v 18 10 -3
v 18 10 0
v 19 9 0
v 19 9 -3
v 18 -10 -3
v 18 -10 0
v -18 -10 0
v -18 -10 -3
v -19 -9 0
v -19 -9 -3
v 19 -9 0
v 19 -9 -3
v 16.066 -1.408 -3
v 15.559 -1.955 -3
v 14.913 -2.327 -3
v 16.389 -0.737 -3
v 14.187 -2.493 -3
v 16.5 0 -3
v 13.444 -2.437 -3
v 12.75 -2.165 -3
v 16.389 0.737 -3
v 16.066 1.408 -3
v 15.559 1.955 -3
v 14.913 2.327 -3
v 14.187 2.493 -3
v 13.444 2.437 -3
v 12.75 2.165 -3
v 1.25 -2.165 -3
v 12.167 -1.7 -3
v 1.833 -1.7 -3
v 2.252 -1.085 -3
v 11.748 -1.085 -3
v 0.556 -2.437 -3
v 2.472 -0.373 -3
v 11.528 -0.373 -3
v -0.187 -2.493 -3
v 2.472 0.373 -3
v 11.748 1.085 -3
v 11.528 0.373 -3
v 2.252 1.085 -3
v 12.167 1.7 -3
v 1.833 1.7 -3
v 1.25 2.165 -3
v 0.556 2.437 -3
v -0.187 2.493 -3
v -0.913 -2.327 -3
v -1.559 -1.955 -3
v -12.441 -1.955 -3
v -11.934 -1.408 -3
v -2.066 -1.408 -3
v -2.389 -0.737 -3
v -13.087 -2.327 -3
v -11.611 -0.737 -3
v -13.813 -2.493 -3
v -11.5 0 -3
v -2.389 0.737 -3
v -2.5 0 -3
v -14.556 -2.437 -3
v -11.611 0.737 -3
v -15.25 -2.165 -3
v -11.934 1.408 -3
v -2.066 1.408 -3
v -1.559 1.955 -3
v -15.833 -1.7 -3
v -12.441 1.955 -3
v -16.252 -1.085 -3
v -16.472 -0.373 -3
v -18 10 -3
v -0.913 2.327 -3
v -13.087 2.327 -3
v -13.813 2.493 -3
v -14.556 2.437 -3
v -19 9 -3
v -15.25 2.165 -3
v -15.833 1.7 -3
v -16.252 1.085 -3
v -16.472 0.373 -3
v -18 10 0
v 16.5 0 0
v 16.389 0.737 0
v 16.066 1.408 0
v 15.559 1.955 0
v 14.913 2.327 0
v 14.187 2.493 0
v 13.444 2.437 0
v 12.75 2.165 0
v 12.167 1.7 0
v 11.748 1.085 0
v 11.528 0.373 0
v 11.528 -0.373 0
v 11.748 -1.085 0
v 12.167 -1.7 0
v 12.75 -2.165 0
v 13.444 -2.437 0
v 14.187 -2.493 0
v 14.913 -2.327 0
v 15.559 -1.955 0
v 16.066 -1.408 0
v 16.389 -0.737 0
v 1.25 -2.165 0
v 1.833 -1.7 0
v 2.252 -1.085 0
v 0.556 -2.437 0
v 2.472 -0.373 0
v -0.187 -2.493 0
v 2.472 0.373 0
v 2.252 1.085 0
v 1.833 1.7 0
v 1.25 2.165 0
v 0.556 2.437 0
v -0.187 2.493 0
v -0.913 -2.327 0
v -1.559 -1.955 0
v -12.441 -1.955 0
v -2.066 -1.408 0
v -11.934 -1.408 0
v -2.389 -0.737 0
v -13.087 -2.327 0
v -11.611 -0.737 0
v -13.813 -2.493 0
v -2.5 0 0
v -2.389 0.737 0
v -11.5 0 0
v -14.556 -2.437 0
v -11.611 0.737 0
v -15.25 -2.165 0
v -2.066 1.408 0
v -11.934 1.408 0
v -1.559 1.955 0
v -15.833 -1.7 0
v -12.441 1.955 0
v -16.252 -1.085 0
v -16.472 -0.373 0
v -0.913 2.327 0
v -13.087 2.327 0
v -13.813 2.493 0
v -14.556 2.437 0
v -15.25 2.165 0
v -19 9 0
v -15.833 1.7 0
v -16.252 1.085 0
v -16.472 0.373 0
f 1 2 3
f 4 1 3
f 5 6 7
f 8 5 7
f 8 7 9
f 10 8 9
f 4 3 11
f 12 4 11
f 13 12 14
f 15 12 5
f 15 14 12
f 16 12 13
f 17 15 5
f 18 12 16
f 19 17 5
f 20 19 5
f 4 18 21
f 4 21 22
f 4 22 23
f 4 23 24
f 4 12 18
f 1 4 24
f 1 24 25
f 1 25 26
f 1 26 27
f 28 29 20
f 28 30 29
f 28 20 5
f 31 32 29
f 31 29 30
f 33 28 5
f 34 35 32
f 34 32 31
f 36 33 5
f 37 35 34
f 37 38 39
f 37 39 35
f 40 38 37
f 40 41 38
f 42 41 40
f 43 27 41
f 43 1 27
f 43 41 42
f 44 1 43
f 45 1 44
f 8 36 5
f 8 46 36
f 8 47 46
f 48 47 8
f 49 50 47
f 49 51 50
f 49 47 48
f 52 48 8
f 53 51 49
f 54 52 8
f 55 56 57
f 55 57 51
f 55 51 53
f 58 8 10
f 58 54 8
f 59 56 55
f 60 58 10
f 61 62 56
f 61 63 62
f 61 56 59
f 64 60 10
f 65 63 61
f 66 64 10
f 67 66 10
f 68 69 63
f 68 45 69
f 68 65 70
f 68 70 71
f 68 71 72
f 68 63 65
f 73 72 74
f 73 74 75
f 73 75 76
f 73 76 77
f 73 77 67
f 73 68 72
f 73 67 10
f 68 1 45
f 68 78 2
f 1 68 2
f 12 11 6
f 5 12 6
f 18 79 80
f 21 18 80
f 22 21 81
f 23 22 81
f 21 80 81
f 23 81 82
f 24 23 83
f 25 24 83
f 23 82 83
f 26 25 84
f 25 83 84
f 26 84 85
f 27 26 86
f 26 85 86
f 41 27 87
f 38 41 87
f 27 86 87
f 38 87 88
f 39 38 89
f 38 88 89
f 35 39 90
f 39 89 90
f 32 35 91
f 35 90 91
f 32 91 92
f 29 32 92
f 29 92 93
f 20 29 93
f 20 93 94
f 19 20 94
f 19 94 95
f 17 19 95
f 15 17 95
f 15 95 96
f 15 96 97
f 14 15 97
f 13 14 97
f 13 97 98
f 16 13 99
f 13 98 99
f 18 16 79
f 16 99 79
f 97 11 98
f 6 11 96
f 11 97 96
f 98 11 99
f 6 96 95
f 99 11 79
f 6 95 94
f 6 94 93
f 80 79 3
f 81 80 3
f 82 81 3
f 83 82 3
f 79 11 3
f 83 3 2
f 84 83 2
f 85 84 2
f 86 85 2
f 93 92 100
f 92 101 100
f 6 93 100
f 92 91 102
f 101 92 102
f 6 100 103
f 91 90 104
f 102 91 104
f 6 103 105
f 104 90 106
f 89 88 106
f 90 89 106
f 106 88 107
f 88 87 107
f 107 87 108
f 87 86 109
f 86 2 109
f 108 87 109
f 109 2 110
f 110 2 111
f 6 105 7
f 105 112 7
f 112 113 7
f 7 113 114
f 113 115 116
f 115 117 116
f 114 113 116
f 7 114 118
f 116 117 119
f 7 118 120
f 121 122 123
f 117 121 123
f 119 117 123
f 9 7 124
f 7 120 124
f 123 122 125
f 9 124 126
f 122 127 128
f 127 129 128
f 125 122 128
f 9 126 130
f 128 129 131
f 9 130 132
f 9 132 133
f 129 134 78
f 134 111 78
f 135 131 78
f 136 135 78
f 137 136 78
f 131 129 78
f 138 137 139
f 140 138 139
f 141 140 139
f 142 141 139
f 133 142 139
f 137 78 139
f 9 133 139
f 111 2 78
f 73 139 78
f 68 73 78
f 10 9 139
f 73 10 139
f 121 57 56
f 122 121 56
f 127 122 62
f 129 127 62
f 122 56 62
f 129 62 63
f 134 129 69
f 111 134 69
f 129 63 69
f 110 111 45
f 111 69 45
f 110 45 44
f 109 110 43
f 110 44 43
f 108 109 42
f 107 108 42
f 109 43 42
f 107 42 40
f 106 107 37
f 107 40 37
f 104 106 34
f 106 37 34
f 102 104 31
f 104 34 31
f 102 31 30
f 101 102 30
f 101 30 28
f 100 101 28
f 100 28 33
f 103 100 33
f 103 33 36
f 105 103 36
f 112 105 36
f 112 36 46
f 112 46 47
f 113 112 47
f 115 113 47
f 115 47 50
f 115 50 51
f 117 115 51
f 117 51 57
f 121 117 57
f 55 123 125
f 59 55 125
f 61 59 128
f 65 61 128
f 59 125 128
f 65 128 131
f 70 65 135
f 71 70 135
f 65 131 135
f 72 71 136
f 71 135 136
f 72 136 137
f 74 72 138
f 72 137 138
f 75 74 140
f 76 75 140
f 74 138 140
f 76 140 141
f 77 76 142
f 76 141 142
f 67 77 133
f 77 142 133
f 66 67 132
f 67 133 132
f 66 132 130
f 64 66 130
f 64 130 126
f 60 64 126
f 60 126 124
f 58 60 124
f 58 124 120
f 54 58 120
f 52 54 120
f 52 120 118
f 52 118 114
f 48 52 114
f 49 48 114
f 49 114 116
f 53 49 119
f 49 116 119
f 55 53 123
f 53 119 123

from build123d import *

# Parameters (mm, degrees)
SKETCH_1_R             = 2.5
SM_BASE_FLANGE_1_DEPTH = 3
HOLE_WIZARD_M6_1_D     = 5
HOLE_WIZARD_M6_1_DEPTH = 19
HOLE_WIZARD_M6_1_TIP   = 1.502151548


# Sheet-metal steps are written as plain solids
with BuildPart() as part:
    # Sketch 1 → 基体-法兰1 (new body)
    with BuildSketch(Plane.XY):
        Polygon((-18, 10), (18, 10), (19, 9), (19, -9), (18, -10), (-18, -10), (-19, -9), (-19, 9), align=None)
        with Locations((-14, 0)):
            Circle(SKETCH_1_R, mode=Mode.SUBTRACT)
        with Locations((14, 0)):
            Circle(SKETCH_1_R, mode=Mode.SUBTRACT)
    extrude(amount=-SM_BASE_FLANGE_1_DEPTH)

    # M6 螺纹孔1
    with Locations(Plane.XY):
        with Locations((0, 0)):
            Hole(HOLE_WIZARD_M6_1_D / 2, depth=HOLE_WIZARD_M6_1_DEPTH)
            with Locations((0, 0, -(HOLE_WIZARD_M6_1_DEPTH + HOLE_WIZARD_M6_1_TIP / 2))):  # 118° drill point
                Cone(0, HOLE_WIZARD_M6_1_D / 2, HOLE_WIZARD_M6_1_TIP, mode=Mode.SUBTRACT)


solid = part.part
